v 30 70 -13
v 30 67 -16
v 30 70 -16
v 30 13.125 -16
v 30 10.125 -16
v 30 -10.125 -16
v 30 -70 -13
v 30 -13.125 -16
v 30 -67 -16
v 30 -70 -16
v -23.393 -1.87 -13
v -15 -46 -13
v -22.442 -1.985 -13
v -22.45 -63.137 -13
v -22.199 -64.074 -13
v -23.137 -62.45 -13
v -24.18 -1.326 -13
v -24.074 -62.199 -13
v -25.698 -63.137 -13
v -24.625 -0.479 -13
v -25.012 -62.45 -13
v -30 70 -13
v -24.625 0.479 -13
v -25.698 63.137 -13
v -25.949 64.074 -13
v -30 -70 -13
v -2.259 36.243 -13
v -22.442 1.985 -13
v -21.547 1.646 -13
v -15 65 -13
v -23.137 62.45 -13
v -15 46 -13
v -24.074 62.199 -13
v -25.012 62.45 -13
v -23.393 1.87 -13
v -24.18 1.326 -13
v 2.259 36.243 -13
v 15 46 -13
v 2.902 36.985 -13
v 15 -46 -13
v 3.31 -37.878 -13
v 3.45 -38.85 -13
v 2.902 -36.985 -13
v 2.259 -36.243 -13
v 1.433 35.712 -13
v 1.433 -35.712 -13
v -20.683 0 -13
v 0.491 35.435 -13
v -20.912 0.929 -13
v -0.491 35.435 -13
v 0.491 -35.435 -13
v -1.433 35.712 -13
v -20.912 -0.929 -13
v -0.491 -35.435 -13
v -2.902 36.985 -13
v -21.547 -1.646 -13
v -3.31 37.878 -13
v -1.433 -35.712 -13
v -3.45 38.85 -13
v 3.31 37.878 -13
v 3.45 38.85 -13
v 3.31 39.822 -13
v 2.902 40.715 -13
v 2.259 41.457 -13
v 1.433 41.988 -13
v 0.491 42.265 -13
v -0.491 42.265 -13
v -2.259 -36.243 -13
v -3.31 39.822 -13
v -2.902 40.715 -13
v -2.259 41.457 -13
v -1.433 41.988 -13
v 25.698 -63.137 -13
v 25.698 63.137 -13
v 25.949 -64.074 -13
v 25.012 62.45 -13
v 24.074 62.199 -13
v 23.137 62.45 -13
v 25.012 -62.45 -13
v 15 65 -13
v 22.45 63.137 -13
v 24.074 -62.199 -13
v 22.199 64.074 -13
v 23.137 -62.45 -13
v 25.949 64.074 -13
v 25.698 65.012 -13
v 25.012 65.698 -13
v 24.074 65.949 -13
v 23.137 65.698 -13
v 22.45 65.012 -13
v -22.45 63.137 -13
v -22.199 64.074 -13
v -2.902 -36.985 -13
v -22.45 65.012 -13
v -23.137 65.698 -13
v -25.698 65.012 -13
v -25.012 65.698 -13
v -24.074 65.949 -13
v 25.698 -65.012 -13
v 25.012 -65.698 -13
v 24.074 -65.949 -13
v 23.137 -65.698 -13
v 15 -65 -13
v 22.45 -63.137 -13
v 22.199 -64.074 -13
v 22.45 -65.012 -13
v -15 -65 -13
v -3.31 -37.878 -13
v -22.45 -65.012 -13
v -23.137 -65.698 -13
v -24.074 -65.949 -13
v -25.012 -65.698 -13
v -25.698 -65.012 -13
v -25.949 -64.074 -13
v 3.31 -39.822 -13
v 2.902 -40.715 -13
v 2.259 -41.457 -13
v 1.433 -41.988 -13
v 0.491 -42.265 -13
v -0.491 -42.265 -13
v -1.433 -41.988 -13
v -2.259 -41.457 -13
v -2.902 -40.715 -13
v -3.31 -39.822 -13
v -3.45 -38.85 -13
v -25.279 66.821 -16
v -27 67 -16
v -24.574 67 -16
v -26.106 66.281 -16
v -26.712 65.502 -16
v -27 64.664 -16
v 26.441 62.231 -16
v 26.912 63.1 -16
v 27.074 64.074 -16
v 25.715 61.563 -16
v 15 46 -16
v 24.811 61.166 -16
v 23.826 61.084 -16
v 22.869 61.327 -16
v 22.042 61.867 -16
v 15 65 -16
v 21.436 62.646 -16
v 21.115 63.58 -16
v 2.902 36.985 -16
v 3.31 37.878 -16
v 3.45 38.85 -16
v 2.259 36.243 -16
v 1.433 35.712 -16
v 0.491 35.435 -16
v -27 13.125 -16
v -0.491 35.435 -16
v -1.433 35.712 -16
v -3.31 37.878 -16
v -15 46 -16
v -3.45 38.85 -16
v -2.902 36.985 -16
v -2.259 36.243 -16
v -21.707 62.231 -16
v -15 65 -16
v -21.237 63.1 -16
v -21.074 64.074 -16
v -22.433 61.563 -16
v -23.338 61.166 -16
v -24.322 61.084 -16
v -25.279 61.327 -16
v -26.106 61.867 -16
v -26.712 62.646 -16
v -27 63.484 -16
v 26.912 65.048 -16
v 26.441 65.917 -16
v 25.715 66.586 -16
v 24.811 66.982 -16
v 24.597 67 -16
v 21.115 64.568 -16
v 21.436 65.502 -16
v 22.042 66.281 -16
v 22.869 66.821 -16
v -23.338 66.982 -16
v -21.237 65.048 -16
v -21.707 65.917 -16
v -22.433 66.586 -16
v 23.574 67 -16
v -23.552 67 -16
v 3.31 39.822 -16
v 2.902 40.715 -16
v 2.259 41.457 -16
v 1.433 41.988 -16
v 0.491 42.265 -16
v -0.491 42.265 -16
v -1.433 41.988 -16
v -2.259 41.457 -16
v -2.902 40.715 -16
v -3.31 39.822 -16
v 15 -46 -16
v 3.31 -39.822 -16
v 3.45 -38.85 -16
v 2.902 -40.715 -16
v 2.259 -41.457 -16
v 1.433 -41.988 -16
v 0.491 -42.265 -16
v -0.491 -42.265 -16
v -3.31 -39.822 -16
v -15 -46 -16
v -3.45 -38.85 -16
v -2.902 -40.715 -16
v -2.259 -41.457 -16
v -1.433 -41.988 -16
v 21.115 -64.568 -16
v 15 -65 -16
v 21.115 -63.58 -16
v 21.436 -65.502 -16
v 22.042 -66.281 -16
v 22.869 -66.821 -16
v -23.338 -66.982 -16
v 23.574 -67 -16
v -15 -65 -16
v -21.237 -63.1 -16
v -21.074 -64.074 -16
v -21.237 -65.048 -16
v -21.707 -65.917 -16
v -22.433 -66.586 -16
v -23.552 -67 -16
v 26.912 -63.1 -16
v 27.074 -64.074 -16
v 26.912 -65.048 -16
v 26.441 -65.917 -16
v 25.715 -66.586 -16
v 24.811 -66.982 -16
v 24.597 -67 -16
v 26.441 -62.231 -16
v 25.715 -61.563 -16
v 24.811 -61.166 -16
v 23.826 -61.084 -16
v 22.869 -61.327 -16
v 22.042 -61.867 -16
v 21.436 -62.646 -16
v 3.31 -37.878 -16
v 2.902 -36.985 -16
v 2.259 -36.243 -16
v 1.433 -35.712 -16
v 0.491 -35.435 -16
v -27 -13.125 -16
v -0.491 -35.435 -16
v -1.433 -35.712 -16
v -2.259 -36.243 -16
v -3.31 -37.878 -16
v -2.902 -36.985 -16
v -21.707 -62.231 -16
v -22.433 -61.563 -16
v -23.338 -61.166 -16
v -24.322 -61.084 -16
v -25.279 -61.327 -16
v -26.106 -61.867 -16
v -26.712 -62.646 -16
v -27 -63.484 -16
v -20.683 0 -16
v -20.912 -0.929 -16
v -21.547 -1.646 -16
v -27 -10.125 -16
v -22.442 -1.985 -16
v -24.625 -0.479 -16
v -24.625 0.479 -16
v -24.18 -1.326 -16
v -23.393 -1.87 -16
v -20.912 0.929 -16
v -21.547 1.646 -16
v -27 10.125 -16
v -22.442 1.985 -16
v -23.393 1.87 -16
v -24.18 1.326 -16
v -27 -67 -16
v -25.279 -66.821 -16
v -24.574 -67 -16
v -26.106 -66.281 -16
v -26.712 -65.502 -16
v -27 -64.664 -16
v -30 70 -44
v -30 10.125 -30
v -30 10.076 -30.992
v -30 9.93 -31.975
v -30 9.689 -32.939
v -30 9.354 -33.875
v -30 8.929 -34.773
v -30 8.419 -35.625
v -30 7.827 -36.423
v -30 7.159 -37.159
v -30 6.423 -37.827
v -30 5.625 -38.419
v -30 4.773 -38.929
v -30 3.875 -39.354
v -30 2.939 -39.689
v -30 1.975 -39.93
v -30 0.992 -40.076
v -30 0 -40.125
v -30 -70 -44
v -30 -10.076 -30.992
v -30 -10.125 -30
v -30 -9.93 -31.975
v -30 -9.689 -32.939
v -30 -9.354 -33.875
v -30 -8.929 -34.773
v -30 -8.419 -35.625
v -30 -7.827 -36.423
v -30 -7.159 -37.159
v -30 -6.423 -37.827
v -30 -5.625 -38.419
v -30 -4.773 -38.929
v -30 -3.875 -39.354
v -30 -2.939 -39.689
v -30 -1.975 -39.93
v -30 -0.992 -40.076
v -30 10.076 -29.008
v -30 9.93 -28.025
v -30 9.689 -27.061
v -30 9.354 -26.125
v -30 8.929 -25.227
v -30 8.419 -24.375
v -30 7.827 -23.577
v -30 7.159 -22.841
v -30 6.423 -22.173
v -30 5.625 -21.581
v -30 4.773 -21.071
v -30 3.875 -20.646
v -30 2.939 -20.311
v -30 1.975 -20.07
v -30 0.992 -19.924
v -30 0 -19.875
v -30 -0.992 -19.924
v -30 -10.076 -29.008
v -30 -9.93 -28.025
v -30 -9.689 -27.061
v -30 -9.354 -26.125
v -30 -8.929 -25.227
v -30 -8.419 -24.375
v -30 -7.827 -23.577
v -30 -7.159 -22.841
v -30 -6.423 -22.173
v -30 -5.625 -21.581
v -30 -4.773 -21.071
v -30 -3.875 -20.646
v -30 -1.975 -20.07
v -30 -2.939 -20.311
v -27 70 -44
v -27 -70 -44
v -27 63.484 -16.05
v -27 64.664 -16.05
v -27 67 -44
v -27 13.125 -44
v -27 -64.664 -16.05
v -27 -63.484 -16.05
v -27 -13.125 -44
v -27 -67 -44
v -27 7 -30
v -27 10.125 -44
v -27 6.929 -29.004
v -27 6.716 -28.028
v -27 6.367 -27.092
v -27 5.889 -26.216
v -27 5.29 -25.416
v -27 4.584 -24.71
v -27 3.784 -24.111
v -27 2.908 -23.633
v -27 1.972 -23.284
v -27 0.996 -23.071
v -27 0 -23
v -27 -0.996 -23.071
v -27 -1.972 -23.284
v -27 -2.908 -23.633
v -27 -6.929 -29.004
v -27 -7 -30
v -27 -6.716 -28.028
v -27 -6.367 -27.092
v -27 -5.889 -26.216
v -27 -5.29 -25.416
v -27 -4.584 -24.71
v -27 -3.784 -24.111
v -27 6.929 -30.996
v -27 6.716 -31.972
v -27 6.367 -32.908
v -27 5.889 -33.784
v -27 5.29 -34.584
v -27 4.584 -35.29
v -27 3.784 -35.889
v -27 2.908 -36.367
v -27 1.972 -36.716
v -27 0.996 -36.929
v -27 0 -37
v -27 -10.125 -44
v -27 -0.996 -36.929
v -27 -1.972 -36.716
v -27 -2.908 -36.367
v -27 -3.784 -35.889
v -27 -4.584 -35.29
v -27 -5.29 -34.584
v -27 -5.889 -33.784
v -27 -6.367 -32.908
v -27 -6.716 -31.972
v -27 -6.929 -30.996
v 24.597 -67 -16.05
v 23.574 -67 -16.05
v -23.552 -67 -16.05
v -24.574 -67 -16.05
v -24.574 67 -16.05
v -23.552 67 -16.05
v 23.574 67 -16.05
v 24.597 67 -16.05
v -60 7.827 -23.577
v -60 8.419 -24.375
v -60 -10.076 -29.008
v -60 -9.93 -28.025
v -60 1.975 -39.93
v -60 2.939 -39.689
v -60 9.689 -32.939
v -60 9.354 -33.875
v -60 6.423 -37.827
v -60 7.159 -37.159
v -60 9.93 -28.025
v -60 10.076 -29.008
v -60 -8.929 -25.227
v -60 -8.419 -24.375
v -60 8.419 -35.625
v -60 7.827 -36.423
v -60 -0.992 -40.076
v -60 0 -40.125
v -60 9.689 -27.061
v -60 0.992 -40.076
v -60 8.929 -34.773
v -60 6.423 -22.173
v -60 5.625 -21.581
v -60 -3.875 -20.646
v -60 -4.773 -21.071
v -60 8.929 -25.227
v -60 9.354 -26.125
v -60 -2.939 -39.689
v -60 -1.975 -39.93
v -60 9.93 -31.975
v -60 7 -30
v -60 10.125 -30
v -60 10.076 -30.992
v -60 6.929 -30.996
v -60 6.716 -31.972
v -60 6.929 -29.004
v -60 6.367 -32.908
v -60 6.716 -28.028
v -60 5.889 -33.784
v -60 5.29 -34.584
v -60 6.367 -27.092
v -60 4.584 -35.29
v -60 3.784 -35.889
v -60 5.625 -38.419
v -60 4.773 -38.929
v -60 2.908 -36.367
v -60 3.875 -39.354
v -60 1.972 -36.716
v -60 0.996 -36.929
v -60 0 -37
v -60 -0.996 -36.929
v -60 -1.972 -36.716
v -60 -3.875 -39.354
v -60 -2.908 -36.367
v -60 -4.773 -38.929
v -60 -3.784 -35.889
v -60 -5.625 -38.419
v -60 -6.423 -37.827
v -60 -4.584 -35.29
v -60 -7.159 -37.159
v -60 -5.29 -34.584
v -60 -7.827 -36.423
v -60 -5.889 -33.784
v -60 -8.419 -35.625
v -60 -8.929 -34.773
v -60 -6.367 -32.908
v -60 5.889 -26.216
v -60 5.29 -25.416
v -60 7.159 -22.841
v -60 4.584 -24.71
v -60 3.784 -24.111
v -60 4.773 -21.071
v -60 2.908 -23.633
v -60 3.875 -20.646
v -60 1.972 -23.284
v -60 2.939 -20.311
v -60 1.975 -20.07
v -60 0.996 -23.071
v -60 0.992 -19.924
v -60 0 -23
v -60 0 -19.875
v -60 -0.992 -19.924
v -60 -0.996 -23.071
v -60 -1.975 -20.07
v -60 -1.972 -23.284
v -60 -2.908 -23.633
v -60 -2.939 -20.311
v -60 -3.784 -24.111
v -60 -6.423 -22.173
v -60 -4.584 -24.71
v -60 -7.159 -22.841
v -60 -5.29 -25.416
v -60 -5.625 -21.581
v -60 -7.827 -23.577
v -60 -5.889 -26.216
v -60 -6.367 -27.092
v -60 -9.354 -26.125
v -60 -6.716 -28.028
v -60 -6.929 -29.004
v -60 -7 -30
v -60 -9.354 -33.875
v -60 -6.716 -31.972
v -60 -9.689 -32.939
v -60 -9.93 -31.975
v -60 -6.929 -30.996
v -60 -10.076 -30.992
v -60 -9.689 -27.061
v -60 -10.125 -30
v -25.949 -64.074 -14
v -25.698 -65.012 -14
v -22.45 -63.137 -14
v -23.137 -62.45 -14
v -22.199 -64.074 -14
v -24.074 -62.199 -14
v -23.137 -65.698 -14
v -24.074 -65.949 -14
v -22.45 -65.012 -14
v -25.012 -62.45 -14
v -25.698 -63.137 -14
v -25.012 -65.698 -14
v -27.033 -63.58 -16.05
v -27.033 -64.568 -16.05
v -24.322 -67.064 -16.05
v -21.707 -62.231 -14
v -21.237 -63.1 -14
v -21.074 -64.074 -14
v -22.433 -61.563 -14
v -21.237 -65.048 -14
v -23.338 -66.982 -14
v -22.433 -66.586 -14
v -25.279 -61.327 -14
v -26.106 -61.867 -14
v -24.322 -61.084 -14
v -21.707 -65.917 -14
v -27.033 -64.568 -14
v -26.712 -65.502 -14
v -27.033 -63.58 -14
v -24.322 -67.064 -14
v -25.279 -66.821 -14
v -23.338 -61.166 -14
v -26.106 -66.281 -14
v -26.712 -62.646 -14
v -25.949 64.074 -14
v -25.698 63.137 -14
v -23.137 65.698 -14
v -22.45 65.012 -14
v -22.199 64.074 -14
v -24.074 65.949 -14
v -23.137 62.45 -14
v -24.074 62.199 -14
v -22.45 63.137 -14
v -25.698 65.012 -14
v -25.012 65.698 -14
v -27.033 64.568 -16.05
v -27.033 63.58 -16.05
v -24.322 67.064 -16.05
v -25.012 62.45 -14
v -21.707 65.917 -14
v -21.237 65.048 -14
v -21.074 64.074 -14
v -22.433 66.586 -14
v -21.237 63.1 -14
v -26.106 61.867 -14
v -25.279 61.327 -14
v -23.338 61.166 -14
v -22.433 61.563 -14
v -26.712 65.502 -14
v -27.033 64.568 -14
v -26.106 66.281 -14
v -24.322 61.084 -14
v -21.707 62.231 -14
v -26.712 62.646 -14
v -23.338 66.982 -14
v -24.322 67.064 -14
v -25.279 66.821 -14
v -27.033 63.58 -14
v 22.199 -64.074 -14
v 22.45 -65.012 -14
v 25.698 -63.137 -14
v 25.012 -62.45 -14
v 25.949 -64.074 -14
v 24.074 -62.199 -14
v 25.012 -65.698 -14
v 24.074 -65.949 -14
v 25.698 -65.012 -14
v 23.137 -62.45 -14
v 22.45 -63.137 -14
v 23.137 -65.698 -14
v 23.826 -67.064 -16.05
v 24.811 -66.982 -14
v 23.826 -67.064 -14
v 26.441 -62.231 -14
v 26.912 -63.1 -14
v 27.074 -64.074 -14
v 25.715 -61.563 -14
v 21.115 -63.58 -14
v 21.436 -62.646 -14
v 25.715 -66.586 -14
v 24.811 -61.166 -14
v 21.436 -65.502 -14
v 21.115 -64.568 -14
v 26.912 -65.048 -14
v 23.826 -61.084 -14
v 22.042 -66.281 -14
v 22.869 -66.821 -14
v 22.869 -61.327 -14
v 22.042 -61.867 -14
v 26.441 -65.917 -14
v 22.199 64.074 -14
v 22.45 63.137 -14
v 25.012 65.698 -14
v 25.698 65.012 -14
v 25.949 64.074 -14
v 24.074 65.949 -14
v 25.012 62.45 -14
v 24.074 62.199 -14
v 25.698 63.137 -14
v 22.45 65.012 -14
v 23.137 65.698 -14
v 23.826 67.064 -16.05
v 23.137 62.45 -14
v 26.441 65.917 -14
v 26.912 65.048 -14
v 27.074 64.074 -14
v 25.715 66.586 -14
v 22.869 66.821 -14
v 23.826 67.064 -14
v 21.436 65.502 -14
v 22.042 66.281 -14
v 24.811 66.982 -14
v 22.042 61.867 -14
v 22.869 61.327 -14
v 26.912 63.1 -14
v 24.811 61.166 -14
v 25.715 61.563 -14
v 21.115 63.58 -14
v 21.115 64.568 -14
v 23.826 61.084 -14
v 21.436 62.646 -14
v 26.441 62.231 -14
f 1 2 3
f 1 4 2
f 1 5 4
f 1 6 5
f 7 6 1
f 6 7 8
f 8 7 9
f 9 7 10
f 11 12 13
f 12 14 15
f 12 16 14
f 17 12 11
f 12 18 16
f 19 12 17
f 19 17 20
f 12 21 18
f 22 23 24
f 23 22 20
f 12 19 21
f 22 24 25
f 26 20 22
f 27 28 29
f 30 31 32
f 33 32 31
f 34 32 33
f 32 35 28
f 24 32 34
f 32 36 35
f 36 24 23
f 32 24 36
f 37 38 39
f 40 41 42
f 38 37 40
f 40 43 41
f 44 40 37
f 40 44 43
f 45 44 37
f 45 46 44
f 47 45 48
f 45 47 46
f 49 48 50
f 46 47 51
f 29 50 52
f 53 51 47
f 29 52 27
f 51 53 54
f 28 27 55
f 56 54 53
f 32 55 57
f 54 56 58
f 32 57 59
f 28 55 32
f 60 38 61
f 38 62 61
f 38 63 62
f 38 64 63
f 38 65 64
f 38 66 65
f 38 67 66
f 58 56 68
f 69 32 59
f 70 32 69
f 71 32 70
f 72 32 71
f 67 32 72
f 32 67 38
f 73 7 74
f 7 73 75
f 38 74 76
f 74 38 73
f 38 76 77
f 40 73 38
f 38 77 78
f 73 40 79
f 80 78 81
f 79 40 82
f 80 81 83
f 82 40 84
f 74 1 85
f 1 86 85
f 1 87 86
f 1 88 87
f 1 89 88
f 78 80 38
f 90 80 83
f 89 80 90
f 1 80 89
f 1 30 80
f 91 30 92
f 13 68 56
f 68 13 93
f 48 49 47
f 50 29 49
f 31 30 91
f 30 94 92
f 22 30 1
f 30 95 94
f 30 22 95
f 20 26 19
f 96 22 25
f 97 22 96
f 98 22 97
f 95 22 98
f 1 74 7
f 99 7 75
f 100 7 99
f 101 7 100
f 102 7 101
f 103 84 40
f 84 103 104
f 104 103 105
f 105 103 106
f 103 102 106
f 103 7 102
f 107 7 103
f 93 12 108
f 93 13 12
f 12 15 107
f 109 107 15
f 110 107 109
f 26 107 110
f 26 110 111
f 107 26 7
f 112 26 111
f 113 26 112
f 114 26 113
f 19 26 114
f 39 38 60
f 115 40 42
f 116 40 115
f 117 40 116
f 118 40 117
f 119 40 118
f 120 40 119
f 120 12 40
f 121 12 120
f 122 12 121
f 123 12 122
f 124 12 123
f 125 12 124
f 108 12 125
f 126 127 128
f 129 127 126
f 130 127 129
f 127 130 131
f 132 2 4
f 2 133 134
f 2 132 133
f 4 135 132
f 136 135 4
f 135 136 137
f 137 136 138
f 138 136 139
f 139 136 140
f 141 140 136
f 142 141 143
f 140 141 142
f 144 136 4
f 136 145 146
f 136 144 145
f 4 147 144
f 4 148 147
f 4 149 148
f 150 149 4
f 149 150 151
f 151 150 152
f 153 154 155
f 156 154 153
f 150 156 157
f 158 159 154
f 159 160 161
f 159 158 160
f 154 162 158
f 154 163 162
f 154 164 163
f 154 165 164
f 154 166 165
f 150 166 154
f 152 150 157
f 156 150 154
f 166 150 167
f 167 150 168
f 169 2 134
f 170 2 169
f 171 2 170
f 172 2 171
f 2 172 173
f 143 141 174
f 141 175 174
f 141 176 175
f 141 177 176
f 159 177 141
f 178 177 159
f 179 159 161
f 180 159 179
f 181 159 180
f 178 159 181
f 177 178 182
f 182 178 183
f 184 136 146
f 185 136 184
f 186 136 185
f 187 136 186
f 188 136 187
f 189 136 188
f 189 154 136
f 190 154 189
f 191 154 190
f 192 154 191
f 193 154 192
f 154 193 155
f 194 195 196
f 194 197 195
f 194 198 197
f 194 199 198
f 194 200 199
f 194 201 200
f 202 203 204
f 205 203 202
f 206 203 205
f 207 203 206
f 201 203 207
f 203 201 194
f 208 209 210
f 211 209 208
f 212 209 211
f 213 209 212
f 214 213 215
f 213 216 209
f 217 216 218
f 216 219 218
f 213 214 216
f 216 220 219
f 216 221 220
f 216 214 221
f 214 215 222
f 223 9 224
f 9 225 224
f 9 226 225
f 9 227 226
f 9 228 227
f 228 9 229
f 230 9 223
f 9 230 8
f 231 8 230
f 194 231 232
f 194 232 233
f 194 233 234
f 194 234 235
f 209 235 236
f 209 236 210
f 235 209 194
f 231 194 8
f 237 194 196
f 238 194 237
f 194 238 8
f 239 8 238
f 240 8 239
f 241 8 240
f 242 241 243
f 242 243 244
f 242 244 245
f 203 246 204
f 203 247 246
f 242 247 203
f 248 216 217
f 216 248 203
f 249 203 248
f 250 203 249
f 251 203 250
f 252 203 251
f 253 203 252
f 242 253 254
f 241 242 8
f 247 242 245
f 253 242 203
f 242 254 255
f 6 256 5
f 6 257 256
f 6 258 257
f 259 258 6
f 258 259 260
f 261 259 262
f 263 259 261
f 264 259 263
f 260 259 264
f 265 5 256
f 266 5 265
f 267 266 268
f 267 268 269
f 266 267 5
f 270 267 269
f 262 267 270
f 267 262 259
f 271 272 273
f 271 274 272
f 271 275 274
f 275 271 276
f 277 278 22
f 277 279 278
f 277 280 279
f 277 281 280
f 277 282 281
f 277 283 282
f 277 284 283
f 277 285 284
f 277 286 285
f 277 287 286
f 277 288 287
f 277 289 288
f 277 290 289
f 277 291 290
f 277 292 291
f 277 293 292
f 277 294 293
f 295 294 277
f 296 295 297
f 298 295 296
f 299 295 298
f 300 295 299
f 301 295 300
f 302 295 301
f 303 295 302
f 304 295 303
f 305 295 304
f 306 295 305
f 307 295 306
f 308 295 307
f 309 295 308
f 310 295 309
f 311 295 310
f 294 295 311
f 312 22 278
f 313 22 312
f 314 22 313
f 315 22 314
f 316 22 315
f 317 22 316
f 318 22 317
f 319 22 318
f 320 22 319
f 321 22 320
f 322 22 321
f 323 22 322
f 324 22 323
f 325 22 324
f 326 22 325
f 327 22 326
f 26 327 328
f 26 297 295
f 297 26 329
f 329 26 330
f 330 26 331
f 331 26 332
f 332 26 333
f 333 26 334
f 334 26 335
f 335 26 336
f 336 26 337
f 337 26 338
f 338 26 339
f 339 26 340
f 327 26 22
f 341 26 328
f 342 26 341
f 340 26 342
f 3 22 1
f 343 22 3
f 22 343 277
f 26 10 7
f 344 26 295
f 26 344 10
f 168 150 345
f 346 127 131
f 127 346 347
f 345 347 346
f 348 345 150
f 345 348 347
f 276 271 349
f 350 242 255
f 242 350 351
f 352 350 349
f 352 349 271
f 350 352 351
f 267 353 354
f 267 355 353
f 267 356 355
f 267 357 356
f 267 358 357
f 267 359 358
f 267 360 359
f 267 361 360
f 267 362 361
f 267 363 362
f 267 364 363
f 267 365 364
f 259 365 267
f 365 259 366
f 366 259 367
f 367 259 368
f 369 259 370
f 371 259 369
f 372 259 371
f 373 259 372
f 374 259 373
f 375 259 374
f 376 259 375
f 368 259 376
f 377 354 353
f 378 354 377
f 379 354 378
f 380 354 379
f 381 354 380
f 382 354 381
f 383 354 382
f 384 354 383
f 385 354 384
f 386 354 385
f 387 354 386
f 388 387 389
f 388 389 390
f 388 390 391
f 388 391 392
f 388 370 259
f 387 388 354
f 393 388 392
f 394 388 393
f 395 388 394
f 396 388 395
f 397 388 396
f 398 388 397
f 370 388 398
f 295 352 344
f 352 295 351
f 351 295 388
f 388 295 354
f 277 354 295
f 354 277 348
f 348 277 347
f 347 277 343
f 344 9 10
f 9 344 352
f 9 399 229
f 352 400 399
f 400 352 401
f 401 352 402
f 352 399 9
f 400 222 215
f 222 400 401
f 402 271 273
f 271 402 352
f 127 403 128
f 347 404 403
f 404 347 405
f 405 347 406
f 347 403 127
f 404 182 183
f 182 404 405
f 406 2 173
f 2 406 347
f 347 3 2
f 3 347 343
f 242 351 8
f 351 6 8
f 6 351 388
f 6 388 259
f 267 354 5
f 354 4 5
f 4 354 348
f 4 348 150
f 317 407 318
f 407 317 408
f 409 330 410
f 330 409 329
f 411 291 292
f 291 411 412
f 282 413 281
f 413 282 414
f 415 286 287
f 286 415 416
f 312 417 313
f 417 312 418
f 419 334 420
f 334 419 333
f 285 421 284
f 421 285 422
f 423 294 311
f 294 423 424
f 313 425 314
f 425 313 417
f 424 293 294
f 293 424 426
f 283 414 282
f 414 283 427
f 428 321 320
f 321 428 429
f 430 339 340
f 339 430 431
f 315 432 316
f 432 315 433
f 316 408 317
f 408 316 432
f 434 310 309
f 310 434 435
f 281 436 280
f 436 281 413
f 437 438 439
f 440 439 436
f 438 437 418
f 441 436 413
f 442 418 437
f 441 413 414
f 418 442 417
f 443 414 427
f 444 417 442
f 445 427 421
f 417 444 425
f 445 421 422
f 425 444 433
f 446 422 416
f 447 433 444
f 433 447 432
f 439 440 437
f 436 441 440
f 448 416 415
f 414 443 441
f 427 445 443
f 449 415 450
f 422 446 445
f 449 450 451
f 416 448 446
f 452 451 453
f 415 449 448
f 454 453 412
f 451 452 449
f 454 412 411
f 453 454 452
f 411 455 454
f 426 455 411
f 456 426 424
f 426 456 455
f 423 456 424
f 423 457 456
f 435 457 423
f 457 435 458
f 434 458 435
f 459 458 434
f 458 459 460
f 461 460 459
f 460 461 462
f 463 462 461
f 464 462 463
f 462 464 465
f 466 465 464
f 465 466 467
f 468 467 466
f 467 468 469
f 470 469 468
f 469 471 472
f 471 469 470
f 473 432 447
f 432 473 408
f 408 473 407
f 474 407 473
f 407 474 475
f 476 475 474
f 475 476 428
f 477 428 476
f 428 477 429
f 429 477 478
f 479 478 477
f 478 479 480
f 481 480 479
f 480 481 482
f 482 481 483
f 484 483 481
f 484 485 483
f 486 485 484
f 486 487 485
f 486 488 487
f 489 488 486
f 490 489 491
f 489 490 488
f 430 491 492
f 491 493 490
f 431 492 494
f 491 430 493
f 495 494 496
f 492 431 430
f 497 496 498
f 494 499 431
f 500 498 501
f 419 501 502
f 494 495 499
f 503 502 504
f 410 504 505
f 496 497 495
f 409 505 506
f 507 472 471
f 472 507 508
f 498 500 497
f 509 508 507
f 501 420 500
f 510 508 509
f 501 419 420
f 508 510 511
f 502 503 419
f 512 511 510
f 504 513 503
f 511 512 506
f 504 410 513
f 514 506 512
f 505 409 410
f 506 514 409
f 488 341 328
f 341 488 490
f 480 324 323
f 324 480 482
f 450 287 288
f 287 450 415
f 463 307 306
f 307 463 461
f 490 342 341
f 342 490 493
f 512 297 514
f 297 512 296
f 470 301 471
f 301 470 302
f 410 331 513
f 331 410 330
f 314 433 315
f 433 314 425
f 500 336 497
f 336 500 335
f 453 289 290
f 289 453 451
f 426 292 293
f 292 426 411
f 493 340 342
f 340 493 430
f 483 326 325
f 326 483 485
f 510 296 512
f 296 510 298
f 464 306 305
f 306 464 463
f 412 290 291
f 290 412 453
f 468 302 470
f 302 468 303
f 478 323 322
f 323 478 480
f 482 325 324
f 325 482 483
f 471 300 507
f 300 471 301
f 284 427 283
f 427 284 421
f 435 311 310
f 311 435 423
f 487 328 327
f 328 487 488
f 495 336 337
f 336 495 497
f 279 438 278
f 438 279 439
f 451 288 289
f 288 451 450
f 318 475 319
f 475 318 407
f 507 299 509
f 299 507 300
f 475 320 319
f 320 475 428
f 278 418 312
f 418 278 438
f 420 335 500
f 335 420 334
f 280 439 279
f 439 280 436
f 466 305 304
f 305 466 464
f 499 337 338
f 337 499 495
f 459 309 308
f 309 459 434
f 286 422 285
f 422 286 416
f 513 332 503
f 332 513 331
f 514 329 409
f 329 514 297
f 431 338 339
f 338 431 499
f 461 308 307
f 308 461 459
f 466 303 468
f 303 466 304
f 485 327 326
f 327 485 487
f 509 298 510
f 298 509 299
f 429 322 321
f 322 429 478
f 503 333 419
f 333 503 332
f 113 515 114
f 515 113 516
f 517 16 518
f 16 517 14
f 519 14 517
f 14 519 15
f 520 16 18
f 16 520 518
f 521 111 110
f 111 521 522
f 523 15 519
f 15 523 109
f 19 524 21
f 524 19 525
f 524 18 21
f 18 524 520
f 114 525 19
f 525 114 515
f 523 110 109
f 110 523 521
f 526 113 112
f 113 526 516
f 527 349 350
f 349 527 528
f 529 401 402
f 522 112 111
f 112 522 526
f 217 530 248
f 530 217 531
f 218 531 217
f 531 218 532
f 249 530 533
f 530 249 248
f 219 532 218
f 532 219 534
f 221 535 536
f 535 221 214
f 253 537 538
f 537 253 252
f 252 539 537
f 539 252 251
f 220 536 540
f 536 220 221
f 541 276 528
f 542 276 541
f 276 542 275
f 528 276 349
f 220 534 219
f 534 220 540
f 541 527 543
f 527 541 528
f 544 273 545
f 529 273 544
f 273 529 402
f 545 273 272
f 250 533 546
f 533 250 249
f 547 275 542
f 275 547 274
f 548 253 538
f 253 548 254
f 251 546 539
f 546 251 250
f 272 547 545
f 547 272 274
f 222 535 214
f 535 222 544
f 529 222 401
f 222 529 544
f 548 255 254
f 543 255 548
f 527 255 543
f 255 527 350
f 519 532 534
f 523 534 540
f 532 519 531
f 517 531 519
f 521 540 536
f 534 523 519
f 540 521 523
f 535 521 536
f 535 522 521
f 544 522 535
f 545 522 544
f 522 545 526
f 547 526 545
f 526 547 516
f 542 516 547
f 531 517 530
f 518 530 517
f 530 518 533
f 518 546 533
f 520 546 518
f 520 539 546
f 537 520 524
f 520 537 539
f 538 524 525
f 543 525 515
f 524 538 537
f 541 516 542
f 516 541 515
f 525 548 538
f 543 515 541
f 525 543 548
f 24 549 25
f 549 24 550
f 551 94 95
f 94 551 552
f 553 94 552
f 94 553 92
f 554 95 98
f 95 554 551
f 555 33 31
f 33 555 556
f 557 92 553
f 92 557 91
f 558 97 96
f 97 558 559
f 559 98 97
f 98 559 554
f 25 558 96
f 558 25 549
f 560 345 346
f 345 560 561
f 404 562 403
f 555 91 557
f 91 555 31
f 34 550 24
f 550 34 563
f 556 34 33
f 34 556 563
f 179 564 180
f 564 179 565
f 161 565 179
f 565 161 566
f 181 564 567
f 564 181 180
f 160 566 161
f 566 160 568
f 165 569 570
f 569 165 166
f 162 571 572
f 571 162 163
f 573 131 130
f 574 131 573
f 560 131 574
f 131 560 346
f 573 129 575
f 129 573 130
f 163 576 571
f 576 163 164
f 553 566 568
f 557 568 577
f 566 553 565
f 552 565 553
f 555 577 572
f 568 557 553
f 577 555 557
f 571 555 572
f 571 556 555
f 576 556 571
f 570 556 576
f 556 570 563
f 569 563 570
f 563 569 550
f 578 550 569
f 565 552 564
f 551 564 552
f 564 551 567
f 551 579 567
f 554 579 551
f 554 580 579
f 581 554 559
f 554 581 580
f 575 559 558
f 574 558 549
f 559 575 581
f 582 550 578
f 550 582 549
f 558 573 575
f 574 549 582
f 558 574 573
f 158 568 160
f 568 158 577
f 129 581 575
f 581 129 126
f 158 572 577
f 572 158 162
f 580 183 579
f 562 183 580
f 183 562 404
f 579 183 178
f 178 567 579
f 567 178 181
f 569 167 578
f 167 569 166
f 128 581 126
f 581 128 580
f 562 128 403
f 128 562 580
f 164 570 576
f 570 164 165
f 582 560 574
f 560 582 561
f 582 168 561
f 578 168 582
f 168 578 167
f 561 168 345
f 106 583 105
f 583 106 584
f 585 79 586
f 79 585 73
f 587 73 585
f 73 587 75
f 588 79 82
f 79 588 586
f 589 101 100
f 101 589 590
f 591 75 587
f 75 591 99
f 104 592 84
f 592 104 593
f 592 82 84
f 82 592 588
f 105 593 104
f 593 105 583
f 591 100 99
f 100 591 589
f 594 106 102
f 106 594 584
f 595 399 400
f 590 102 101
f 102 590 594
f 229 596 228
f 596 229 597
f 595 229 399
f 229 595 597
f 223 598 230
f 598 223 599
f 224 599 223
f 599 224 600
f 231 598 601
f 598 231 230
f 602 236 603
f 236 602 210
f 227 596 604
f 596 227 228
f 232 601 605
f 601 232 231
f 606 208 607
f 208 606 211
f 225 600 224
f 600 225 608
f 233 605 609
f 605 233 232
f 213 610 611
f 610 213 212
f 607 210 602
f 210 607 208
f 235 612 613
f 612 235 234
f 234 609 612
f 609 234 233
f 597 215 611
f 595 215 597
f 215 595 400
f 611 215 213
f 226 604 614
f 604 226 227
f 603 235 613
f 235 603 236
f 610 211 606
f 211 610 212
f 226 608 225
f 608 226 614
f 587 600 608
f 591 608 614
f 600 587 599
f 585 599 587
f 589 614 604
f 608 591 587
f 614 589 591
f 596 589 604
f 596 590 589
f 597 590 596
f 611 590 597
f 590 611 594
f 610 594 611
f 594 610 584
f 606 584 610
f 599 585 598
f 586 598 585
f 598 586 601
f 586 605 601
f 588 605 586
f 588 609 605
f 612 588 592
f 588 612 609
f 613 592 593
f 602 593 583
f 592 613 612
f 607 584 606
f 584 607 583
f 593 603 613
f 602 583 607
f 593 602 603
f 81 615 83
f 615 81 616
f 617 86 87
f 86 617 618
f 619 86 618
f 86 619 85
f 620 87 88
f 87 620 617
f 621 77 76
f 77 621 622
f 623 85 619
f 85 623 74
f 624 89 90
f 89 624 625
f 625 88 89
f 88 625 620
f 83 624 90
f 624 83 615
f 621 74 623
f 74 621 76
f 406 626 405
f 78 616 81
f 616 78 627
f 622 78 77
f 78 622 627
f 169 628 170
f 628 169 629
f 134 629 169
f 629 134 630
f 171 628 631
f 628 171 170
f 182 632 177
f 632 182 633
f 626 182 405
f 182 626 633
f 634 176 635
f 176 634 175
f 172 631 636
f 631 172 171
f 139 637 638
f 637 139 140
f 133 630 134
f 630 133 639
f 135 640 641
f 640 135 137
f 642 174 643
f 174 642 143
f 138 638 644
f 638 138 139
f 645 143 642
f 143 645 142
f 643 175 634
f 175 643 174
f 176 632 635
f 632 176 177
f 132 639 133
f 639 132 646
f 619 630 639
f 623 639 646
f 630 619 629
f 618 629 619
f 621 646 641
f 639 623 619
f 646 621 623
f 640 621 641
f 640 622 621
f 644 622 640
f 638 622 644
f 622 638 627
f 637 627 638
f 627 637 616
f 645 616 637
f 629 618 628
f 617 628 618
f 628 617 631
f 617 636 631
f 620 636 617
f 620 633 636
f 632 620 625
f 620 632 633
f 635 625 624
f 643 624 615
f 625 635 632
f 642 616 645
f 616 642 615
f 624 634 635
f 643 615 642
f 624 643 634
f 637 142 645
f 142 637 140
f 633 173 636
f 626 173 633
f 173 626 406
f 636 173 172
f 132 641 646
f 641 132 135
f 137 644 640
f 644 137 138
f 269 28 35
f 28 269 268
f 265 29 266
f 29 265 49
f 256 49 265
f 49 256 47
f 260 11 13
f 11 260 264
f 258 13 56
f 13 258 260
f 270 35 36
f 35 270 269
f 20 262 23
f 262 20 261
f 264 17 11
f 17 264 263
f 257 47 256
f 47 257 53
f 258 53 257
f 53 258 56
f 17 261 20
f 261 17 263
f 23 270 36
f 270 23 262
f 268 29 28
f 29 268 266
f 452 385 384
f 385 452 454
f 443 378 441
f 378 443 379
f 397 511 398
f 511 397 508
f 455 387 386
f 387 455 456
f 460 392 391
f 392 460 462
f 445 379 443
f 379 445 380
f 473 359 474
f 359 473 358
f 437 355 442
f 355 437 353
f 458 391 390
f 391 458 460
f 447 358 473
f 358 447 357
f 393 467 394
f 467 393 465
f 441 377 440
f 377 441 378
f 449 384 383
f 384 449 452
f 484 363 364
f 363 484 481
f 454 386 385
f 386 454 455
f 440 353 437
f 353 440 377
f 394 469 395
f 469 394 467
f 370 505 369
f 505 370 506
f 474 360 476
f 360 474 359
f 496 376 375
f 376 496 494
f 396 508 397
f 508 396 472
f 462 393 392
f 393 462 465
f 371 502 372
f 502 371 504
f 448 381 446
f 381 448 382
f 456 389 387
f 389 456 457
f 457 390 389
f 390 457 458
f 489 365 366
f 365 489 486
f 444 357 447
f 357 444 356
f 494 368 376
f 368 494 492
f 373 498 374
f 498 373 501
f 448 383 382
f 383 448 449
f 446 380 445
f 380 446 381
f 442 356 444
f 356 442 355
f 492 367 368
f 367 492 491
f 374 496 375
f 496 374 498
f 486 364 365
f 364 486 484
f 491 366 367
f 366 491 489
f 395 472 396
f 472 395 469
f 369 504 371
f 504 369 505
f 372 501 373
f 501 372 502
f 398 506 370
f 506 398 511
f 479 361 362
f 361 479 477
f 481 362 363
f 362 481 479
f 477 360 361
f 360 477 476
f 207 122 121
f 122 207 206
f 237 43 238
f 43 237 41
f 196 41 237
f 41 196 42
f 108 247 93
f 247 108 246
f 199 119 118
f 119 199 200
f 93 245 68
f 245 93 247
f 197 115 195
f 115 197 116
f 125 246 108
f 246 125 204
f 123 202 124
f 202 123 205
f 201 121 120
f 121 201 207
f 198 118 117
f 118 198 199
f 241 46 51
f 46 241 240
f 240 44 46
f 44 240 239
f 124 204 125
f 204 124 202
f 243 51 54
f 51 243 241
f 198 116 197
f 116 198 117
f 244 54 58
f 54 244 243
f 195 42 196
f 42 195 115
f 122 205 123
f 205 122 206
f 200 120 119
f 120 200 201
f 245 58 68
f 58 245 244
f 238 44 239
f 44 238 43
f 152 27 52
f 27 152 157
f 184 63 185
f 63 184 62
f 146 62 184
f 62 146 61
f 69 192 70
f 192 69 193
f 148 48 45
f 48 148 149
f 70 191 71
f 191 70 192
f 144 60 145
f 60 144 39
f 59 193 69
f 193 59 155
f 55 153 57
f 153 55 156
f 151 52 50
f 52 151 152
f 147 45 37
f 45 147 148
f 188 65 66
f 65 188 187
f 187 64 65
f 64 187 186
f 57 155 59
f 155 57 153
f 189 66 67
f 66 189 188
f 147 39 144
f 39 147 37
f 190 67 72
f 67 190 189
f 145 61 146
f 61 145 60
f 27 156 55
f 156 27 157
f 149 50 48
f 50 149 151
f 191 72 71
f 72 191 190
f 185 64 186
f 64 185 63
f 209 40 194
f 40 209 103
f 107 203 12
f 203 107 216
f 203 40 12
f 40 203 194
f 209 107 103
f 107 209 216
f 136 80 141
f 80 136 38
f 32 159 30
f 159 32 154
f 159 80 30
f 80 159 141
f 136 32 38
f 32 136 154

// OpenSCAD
///////////////////////////////////////////////////////////////////////////////////
// 
// Tipping bucket rain gauge
//
// Designed by: Dan Bemowski
// Website    : http://dan.bemowski.info
// 
// This is for building a weather station rain gauge to connect to an arduino 
// microcontroller to measure rainfall amounts. The US standard diameter for a rain
// gauge is 8 in or 20.32 cm.  This was the measurement used to make the funnel.  I 
// use a height of 5 cm for the side wall as a splash guard and larger catchment 
// volume for heavier rainfalls.
//
// This project uses the standard tipping bucket method for measuring the rainfall.
// The tipping bucket is designed to hold a 4.25 mm neodymium disc magnet that will
// pass by a magnetic reed switch that will be attached to the arduino to measure
// the tipping bucket pulses.
//
// For calibrating the gauge, I am using the information from an instructables page
// that deals with connecting a small commercial tipping bucket rain sensor unit to
// an arduino.  The same information applies to this gauge which I am hoping will 
// be slightly more accurate than the small commercial versions.
// http://www.instructables.com/id/Arduino-Rain-Gauge-Calibration/
//
///////////////////////////////////////////////////////////////////////////////////

$fa=1;
$fs=1;

//I always use a fudge factor to fix an issue that happens in preview mode when
//difference is used. The issue is that hashed lines are shown at edges when
//hollowing out an area. Adding a small distance to the area being removed will
//prevent that hashing from showing.
fudge = 0.1;

//Here we define what we want to view
// available options are: base, funnel, tipping_bucket, base_bucket, base_support, all
view = "base_support";

//---------------------------------------------------------------------------------
//**** Funnel dimensions ****
//---------------------------------------------------------------------------------
bowl_h=40; //Funnel bowl height
bowl_r=101.6; //Funnel bowl radius
stem_h=10; //funnel stem height
stem_d=6; //Funnel stem diameter
funnel_wall_t=3; //Funnel wall thickness
splash_guard_d = 209.3; //Raised splash guard diameter
splash_guard_h = 50; //Raised splash guard height
funnel_offset_h = 30; //Funnel offset height

//---------------------------------------------------------------------------------
//**** Funnel cover case dimensions for the tipping bucket assembly ****
//---------------------------------------------------------------------------------
case_w = 60; //Case width
case_l = 140; //Case depth
case_h = 80; //Case height

case_t = 3; //Case wall thickness

//These values are to shave off the top part of the case that sticks into the funnel
//after it is drawn. The values are derived from the defined funnel dimensions. When 
//the funnel is drawn, the inside will then be smooth.
funnel_clearance_h = bowl_h; 
funnel_clearance_bottom_r = stem_d-funnel_wall_t;
funnel_clearance_top_r = bowl_r;

mount_hole_d = 8; //Mounting screw post diameter
screw_hole_d = 3; //Screw

//---------------------------------------------------------------------------------
//**** Tipping bucket ****
//---------------------------------------------------------------------------------
platform_w = 30; //Platform width
platform_l = 106.4; //Platform length 96.4
platform_z_offset = 0; //The offset distance of the platform in the Z direction
bucket_wall_t = 3;  //Thickness of the bucket walls

bucket_divider_h = 17; //Bucket divider height
bucket_divider_v_distance = 32; //Bucket divider height

pivot_arm_support_w = 7; //Pivot arm support_block width
pivot_arm_support_l = 8; //Pivot arm support_block length
pivot_arm_support_h = 5; //Pivot arm support_block height
pivot_peg_d = 3.8; //Pivot peg diameter
pivot_peg_l = 3; //Pivot peg length

magnet_holder_h = 2;
magnet_holder_outer_d = 6.2;
magnet_holder_inner_d = 4.4;

adjustment_standoff_h = 3.5;
adjustment_standoff_d = 10;
adjustment_standoff_spacing = 80;

//---------------------------------------------------------------------------------
//**** Base to hold the tipping bucket assembly ****
//---------------------------------------------------------------------------------
bucket_standoff_w = 4;
bucket_standoff_l = 12;
bucket_standoff_h = 18;

standoff_spacing = platform_w+0.7;

angled_support_w = 5;
angled_support_h = bucket_standoff_h/2;

reed_switch_board_w = 6.5;
reed_switch_board_h = 31;
reed_switch_board_d = 3;
reed_switch_board_offset_x = -4.2;
reed_switch_board_screw_hole_h = 8;

reed_switch_board_holder_offset_z = pivot_arm_support_h+1;
reed_switch_board_holder_h = 30;

reed_switch_board_top_slot_h = 7;
reed_switch_board_top_slot_d = reed_switch_board_d+1;

tipping_bucket_peg_hole_d = 4.5;
tipping_bucket_peg_hole_slot_h = 6;
tipping_bucket_peg_hole_slot_slide_h = 8;

main_base_w = 60;
main_base_l = 140;
main_base_t = 3;

platform_lip_w = 52;
platform_lip_l = 132;
platform_lip_t = 1;

main_base_offset_h = -16;

base_adjustment_standoff_h = 1.32;
base_adjustment_standoff_spacing = 77.7;
base_adjustment_screw_hole_d = 2.9;

side_wall_h = 28;

mounting_pipe_l = 30;
//A standard 3/4" PVC pipe inside diameter is 0.824 in or 20.93 mm, so I made this 
//slightly smaller so it would fit inside the 3/4" pipe
mounting_pipe_od = 20.25; 
//This will give us a 6.25 mm or ~1/4 in wall thickness for the attachment nipple
//which will give it good strength.
mounting_pipe_id = 14;

mounting_screw_head_t = 2;
mounting_screw_head_d = 6;

bucket_drain_w = 30;
bucket_drain_l = 19;
bucket_drain_recess = 2;
bucket_drain_edge_offset = 1;
bucket_drain_hole_w = 4.3;
bucket_drain_hole_l = 6;
//---------------------------------------------------------------------------------

/**
 * funnel_cover - This is the rain catchment funnel with the attached cover for the
 *                tipping bucket assembly.  
 */
module funnel_cover() {
    difference() {
        //Create the funnel cover case
        case();
        //Shave the top for smoothing the inside of the funnel
        translate([0, 0, funnel_clearance_h-1]) cylindrical_coupling(h=funnel_clearance_h,r1=funnel_clearance_bottom_r,r2=funnel_clearance_top_r);
    }
    //Create the top splash guard
    translate([0, 0, funnel_offset_h+splash_guard_h]) pipe(od=splash_guard_d, id=splash_guard_d-(funnel_wall_t*2), height=splash_guard_h);
    //Add the main funnel
    translate([0, 0, funnel_offset_h]) funnel();
}

/**
 * funnel - Used to create a funnel
 */
module funnel() {
    translate([0, 0, stem_h]) {
        difference() {
            cylindrical_coupling(h=bowl_h,r1=(stem_d/2)+funnel_wall_t,r2=bowl_r+funnel_wall_t);
            cylindrical_coupling(h=bowl_h+1,r1=(stem_d/2),r2=bowl_r);
        }
    }
    pipe(od=stem_d+(funnel_wall_t*2), id=stem_d, height=stem_h);
}

/**
 * pipe - Used to create a pipe with a defined outside and inside diameter and 
 *        height/length
 */
module pipe(od=10, id=7, height=10) {
    difference() {
        cylinder(d=od, h=height);
        translate([0,0,-1]) cylinder(d=id, h=height+2);
    }
}

/**
 * case - Used to create the box shroud for the tipping bucket assembly with 
 *        mounting screw standoffs
 */
module case() {
    difference() {
        translate([-(case_w/2), -(case_l/2), -16]) cube([case_w, case_l, case_h]);
        translate([-(case_w/2)+case_t, -(case_l/2)+case_t, -17]) cube([case_w-(case_t*2), case_l-(case_t*2), 82]);
    }
    for(x=[-1, 1], y=[-1, 1]) {
        difference() {
            translate([x*((case_w/2)-(mount_hole_d/1.35)), y*((case_l/2)-(mount_hole_d/1.35)), -14.75]) cylinder(case_h, d=mount_hole_d);
            translate([x*((case_w/2)-(mount_hole_d/1.35)), y*((case_l/2)-(mount_hole_d/1.35)), -14.75]) cylinder(case_h, d=screw_hole_d);
        }
    }
}

/**
 * bucket - Used to create the tipping bucket
 */
module bucket() {
    translate([0, 0, pivot_arm_support_h]) {
        difference() {
            union() {
                //main bucket platform
                translate([-(platform_w/2), -(platform_l/2), platform_z_offset]) cube([platform_w, platform_l, bucket_wall_t]);

                //pivot 1
                translate([(platform_w/2)-pivot_arm_support_w, -4, platform_z_offset-pivot_arm_support_h]) cube([pivot_arm_support_w, pivot_arm_support_l, pivot_arm_support_h]);
                translate([(platform_w/2)-pivot_arm_support_w, 0, platform_z_offset-pivot_arm_support_h]) rotate([90, 0, 90]) cylinder(d=pivot_arm_support_l, h=pivot_arm_support_w);
                translate([(platform_w/2), 0, platform_z_offset-pivot_arm_support_h]) rotate([90, 0, 90]) cylinder(d=pivot_peg_d, h=pivot_peg_l);

                //pivot 2
                translate([-(platform_w/2), -4, platform_z_offset-pivot_arm_support_h]) cube([pivot_arm_support_w, pivot_arm_support_l, pivot_arm_support_h]);
                translate([-(platform_w/2), 0, platform_z_offset-pivot_arm_support_h]) rotate([90, 0, 90]) cylinder(d=pivot_arm_support_l, h=pivot_arm_support_w);
                translate([-(platform_w/2)-pivot_peg_l, 0, platform_z_offset-pivot_arm_support_h]) rotate([90, 0, 90])  cylinder(d=pivot_peg_d, h=pivot_peg_l);

                //bucket divider
                translate([(platform_w/2), 0, platform_z_offset+bucket_wall_t]) rotate([0, 270, 0]) Triangle(a=(bucket_divider_v_distance/2), b=bucket_divider_h, angle=90, height=platform_w);
                translate([-(platform_w/2), 0, platform_z_offset+bucket_wall_t]) rotate([180, 270, 0]) Triangle(a=(bucket_divider_v_distance/2), b=bucket_divider_h, angle=90, height=platform_w);

                //bucket sides
                translate([(platform_w/2), 0, platform_z_offset+bucket_wall_t]) rotate([0, 270, 0]) Triangle(a=platform_l/2, b=bucket_divider_h, angle=90, height=3);
                translate([-(platform_w/2)+bucket_wall_t, 0, platform_z_offset+bucket_wall_t]) rotate([0, 270, 0]) Triangle(a=platform_l/2, b=bucket_divider_h, angle=90, height=3);
                translate([(platform_w/2)-bucket_wall_t, 0, platform_z_offset+bucket_wall_t]) rotate([180, 270, 0]) Triangle(a=platform_l/2, b=bucket_divider_h, angle=90, height=3);
                translate([-(platform_w/2), 0, platform_z_offset+bucket_wall_t]) rotate([180, 270, 0]) Triangle(a=platform_l/2, b=bucket_divider_h, angle=90, height=3);

                //round magnet holder for
                difference() {
                    translate([-(platform_w/2)-magnet_holder_h, 0, platform_z_offset+16.5]) rotate([90, 0, 90]) cylinder(d=magnet_holder_outer_d, h=magnet_holder_h);
                    translate([-(platform_w/2)-magnet_holder_h-(fudge/2), 0, platform_z_offset+16.5]) rotate([90, 0, 90]) cylinder(d=magnet_holder_inner_d, h=magnet_holder_h);
                }
                //offset weight to balance the other side
                translate([(platform_w/2), 0, platform_z_offset+16.5]) rotate([90, 0, 90]) cylinder(d=magnet_holder_outer_d, h=magnet_holder_h);
                //adjustment standoffs
                difference() {
                    translate([0, adjustment_standoff_spacing/2, platform_z_offset-(adjustment_standoff_h/2)]) rotate([20, 0, 0]) cylinder(d=adjustment_standoff_d, h=adjustment_standoff_h);
                    translate([-4, adjustment_standoff_spacing/2, platform_z_offset+3]) cube([8, 8, 1]);
                }
                difference() {
                    translate([0, -(adjustment_standoff_spacing/2), platform_z_offset-(adjustment_standoff_h/2)]) rotate([-20, 0, 0]) cylinder(d=adjustment_standoff_d, h=adjustment_standoff_h);
                    translate([-4, -48, platform_z_offset+bucket_wall_t]) cube([8, 8, 1]);
                }
            }
            //hollow out the bucket divider
            translate([(platform_w-(pivot_arm_support_w*2))/2, -(fudge/2), platform_z_offset-(fudge/2)]) rotate([0, 270, 0]) Triangle(a=(bucket_divider_v_distance/2), b=bucket_divider_h, angle=90, height=platform_w-(pivot_arm_support_w*2));
            translate([-(platform_w-(pivot_arm_support_w*2))/2, (fudge/2), platform_z_offset-(fudge/2)]) rotate([180, 270, 0]) Triangle(a=(bucket_divider_v_distance/2), b=bucket_divider_h, angle=90, height=platform_w-(pivot_arm_support_w*2));
            
            //shave off the corners to the same angle as the standoffs
            translate([0, adjustment_standoff_spacing/2-(fudge/2), platform_z_offset-adjustment_standoff_h-(fudge*1.31)]) rotate([20, 0, 0]) cube([platform_w+fudge, adjustment_standoff_d*4, adjustment_standoff_h], center=true);
            translate([0, -(adjustment_standoff_spacing/2)-(fudge/2), platform_z_offset-adjustment_standoff_h-(fudge*1.31)]) rotate([-20, 0, 0]) cube([platform_w+fudge, adjustment_standoff_d*4, adjustment_standoff_h], center=true);
        }
    }
}

/**
 * base - Used to create the base mounting platform that holds the tipping bucket
 *        and the magnetic reed switch.  It also has a side mounting nipple to 
 *        attach to a standard PVC pipe.
 */
module base() {
    // uprights for holding tipping bucket
    difference() {
        union() {
            translate([standoff_spacing/2, -(bucket_standoff_l/2), main_base_offset_h+main_base_t+platform_lip_t]) cube([bucket_standoff_w, bucket_standoff_l, bucket_standoff_h]);
            translate([-(standoff_spacing/2)-bucket_standoff_w, -(bucket_standoff_l/2), main_base_offset_h+main_base_t+platform_lip_t]) cube([bucket_standoff_w, bucket_standoff_l, bucket_standoff_h]);
            translate([-(standoff_spacing/2)-bucket_standoff_w, -(bucket_standoff_l/2), angled_support_w]) rotate([0, 90, 90]) Triangle(a=angled_support_w, b=angled_support_h, angle=90, height=bucket_standoff_l);
            translate([-(standoff_spacing/2)-bucket_standoff_w-angled_support_w, -(bucket_standoff_l/2), angled_support_w]) cube([angled_support_w, bucket_standoff_l, reed_switch_board_holder_h]);
            translate([-(standoff_spacing/2)-bucket_standoff_w-angled_support_w, 0, reed_switch_board_holder_h+angled_support_w]) rotate([0, 90, 0]) cylinder(d=bucket_standoff_l, h=angled_support_w);
        }
        // slot for magnetic reed switch
        translate([-((standoff_spacing/2)+bucket_standoff_w+reed_switch_board_d)-(fudge/2), reed_switch_board_offset_x, reed_switch_board_holder_offset_z]) cube([reed_switch_board_d+fudge, reed_switch_board_w, reed_switch_board_h]);
        //slightly deeper slot space at top for wire connection on reed switch board
        translate([-((standoff_spacing/2)+bucket_standoff_w+reed_switch_board_d+1), reed_switch_board_offset_x, reed_switch_board_h]) cube([reed_switch_board_top_slot_d, reed_switch_board_w, reed_switch_board_top_slot_h]);
        // screw mounting hole for reed switch
        translate([-(standoff_spacing/2)-bucket_standoff_w-angled_support_w-(fudge/2), (reed_switch_board_w/2)+reed_switch_board_offset_x, reed_switch_board_screw_hole_h]) rotate([0, 90, 0]) cylinder(d=1.25, h=8+fudge);
        // hole for wire
        translate([-(standoff_spacing/2)-bucket_standoff_w-angled_support_w-(fudge/2), (reed_switch_board_w/2)+reed_switch_board_offset_x, 36.5]) rotate([0, 90, 0]) cylinder(d=3.25, h=3+fudge);
        //slots for the tipping bucket pegs to rest in
        translate([-((standoff_spacing/2)+(bucket_standoff_w/3)), -(tipping_bucket_peg_hole_d/2), 0]) cube([standoff_spacing+((bucket_standoff_w/3)*2), tipping_bucket_peg_hole_d, tipping_bucket_peg_hole_slot_h]);
        translate([-((standoff_spacing/2)+((bucket_standoff_w/3)*2)), 0, 0]) rotate([0, 90, 0]) cylinder(d=tipping_bucket_peg_hole_d, h=(standoff_spacing+((bucket_standoff_w/3)*2)*2));
        translate([-((standoff_spacing/2)+0.25), -(tipping_bucket_peg_hole_d/2), tipping_bucket_peg_hole_slot_slide_h+fudge]) rotate([0, 90, 90]) Triangle(a=bucket_standoff_w+(fudge/2), b=tipping_bucket_peg_hole_slot_slide_h, angle=90, height=tipping_bucket_peg_hole_d);
        translate([((standoff_spacing/2)+0.25), (tipping_bucket_peg_hole_d/2), tipping_bucket_peg_hole_slot_slide_h+fudge]) rotate([0, 90, 270]) Triangle(a=bucket_standoff_w+(fudge/2), b=tipping_bucket_peg_hole_slot_slide_h, angle=90, height=tipping_bucket_peg_hole_d);
    }

    // main base
    difference() {
        union() {
            // base platform
            translate([-(main_base_w/2), -(main_base_l/2), main_base_offset_h]) cube([main_base_w, main_base_l, main_base_t]);
            // platform lip
            translate([-(platform_lip_w/2), -(platform_lip_l/2), main_base_offset_h+main_base_t]) cube([platform_lip_w, platform_lip_l, platform_lip_t]);
            // bucket tipping adjustment stands
            translate([0, -(base_adjustment_standoff_spacing/2), main_base_offset_h+main_base_t+platform_lip_t]) cylinder(d=adjustment_standoff_d, h=base_adjustment_standoff_h);
            translate([0, (base_adjustment_standoff_spacing/2), main_base_offset_h+main_base_t+platform_lip_t]) cylinder(d=adjustment_standoff_d, h=base_adjustment_standoff_h);
        }
        //hole for wire to drop through to mounting pipe
        translate([-(standoff_spacing/2)-bucket_standoff_w-((angled_support_w*2)/3), 0, main_base_offset_h-(fudge/2)]) cylinder(d=4, h=main_base_t+platform_lip_t+fudge);
        
        //screw holes to attach to the funnel
        for(x=[-1, 1], y=[-1, 1]) {
            translate([x*((case_w/2)-(mount_hole_d/1.35)), y*((case_l/2)-(mount_hole_d/1.35)), main_base_offset_h-(fudge/2)]) cylinder(d=screw_hole_d+0.75, h=base_adjustment_standoff_h+platform_lip_t+main_base_t+fudge);
            //translate([x*((case_w/2)-(mount_hole_d/1.35)), y*((case_l/2)-(mount_hole_d/1.35)), main_base_offset_h-(fudge/2)]) cylinder(d=mounting_screw_head_d, h=mounting_screw_head_t+(fudge/2));
        }
        // bucket adjustment screw holes
        translate([0, -(base_adjustment_standoff_spacing/2), main_base_offset_h-(fudge/2)]) cylinder(d=base_adjustment_screw_hole_d, h=base_adjustment_standoff_h+platform_lip_t+main_base_t+fudge);
        translate([0, (base_adjustment_standoff_spacing/2), main_base_offset_h-(fudge/2)]) cylinder(d=base_adjustment_screw_hole_d, h=base_adjustment_standoff_h+platform_lip_t+main_base_t+fudge);
        
        // left bucket drain
        translate([-(bucket_drain_w/2), -(platform_lip_l/2)+bucket_drain_edge_offset, main_base_offset_h+main_base_t+platform_lip_t-bucket_drain_recess]) cube([bucket_drain_w, bucket_drain_l, bucket_drain_recess+(fudge/2)]);
        
        for(x=[-15, -9.9, -4.7, 0.60, 5.7, 10.7]) {
            for(y=[-65, -58.5, -52]) {
                translate([x, y, main_base_offset_h-(fudge/2)]) cube([bucket_drain_hole_w, bucket_drain_hole_l, main_base_t+platform_lip_t+fudge]);
            }
        }
        
        // right bucket drain
        translate([-(bucket_drain_w/2), (platform_lip_l/2)-bucket_drain_edge_offset-bucket_drain_l, main_base_offset_h+main_base_t+platform_lip_t-bucket_drain_recess]) cube([bucket_drain_w, bucket_drain_l, bucket_drain_recess+(fudge/2)]);
        
        for(x=[-15, -9.9, -4.7, 0.60, 5.7, 10.7]) {
            for(y=[59, 52.5, 46]) {
                translate([x, y, main_base_offset_h-(fudge/2)]) cube([bucket_drain_hole_w, bucket_drain_hole_l, main_base_t+platform_lip_t+fudge]);
            }
        }
    }
}

/**
 * basesupport - Used to create the base mounting platform that holds the tipping bucket
 *               and the magnetic reed switch.  It also has a side mounting nipple to 
 *               attach to a standard PVC pipe.
 */
module base_support() {
    // main base
    difference() {
        union() {
            // base platform
            translate([-(main_base_w/2), -(main_base_l/2), main_base_offset_h]) cube([main_base_w, main_base_l, main_base_t]);
            
            //sides for mounting
            translate([-(main_base_w/2), -(main_base_l/2), main_base_offset_h-side_wall_h]) cube([main_base_t, main_base_l, side_wall_h]);
            translate([-(main_base_w/2)+main_base_t, -(main_base_l/2), main_base_offset_h]) rotate([270, 0, 0]) Triangle(a=side_wall_h, b=main_base_w-main_base_t, angle=90, height=main_base_t);
            translate([-(main_base_w/2)+main_base_t, (main_base_l/2)-main_base_t, main_base_offset_h]) rotate([270, 0, 0]) Triangle(a=side_wall_h, b=main_base_w-main_base_t, angle=90, height=main_base_t);
            translate([-(main_base_w/2)+main_base_t, -((mounting_pipe_od/2)+main_base_t), main_base_offset_h]) rotate([270, 0, 0]) Triangle(a=side_wall_h, b=main_base_w-main_base_t, angle=90, height=main_base_t);
            translate([-(main_base_w/2)+main_base_t, (mounting_pipe_od/2), main_base_offset_h]) rotate([270, 0, 0]) Triangle(a=side_wall_h, b=main_base_w-main_base_t, angle=90, height=main_base_t);
            
            //mounting pipe
            translate([-((main_base_w/2)+mounting_pipe_l), 0, main_base_offset_h-(side_wall_h/2)]) rotate([0, 90, 0]) cylinder(d=mounting_pipe_od, h=mounting_pipe_l);
        }
        //hole for wire to drop through to mounting pipe
        translate([-(standoff_spacing/2)-bucket_standoff_w-((angled_support_w*2)/3), 0, main_base_offset_h-(fudge/2)]) cylinder(d=4, h=main_base_t+platform_lip_t+fudge);
        
        //hollow out the mounting pipe
        translate([-((main_base_w/2)+mounting_pipe_l)-(fudge/2), 0, main_base_offset_h-(side_wall_h/2)]) rotate([0, 90, 0]) cylinder(d=mounting_pipe_id, h=mounting_pipe_l+main_base_t+fudge);
        
        //screw holes to attach to the funnel
        for(x=[-1, 1], y=[-1, 1]) {
            translate([x*((case_w/2)-(mount_hole_d/1.35)), y*((case_l/2)-(mount_hole_d/1.35)), main_base_offset_h-(fudge/2)]) cylinder(d=screw_hole_d+0.75, h=base_adjustment_standoff_h+platform_lip_t+main_base_t+fudge);
            translate([x*((case_w/2)-(mount_hole_d/1.35)), y*((case_l/2)-(mount_hole_d/1.35)), main_base_offset_h-(fudge/2)]) cylinder(d=mounting_screw_head_d, h=mounting_screw_head_t+(fudge/2));
        }
        // bucket adjustment screw holes
        translate([0, -(base_adjustment_standoff_spacing/2), main_base_offset_h-(fudge/2)]) cylinder(d=base_adjustment_screw_hole_d+4, h=base_adjustment_standoff_h+platform_lip_t+main_base_t+fudge);
        translate([0, (base_adjustment_standoff_spacing/2), main_base_offset_h-(fudge/2)]) cylinder(d=base_adjustment_screw_hole_d+4, h=base_adjustment_standoff_h+platform_lip_t+main_base_t+fudge);
        
        // left bucket drain
        translate([-(bucket_drain_w/2), -(platform_lip_l/2)+bucket_drain_edge_offset, main_base_offset_h+main_base_t+platform_lip_t-bucket_drain_recess-3]) cube([bucket_drain_w, bucket_drain_l, bucket_drain_recess+3+(fudge/2)]);
        
        // right bucket drain
        translate([-(bucket_drain_w/2), (platform_lip_l/2)-bucket_drain_edge_offset-bucket_drain_l, main_base_offset_h+main_base_t+platform_lip_t-bucket_drain_recess-3]) cube([bucket_drain_w, bucket_drain_l, bucket_drain_recess+3+(fudge/2)]);
        
    }
}

/**
 * cylindrical_coupling - This is the module used to create the sweeping funnel design 
 */
module cylindrical_coupling(h,r1,r2,shape=0.5, kernel="sigmoid", slices=100) {
    // Method:
    //  1. Calculate transition polygon using the selected kernel function
    //  2. Scale to desired size
    
    // Kernels
    function sigmoid(a,x) =-0.5+ 1 / (1+exp(-a*x));
    function tanh(a,x) = (1-exp(-2*a*x)) /(1+exp(-2*a*x));
    function nonlinear1(a,x) = a*x/sqrt(1+pow(a*x,2));
    function nonlinear2(a,x) = a*x/(1+abs(a*x));
    function linear(a,x) = a*x;
    
    // Select kernel
    function shape_func(a,x) = 
        (kernel=="sigmoid") ? sigmoid(a,x) : 
            (kernel=="tanh") ? tanh(a,x) : 
                (kernel=="linear") ? linear(a,x)  :
                    (kernel=="nonlinear1") ? nonlinear1(a,x) :
                        (kernel=="nonlinear2") ? nonlinear2(a,x) :
                            sigmoid(a,x); echo("WARNING: Unknown kernel. Using sigmoid");
              
    // Draw relative to x=[-10,10]
    x_min = -10;
    x_max = 10;
    x_span = x_max - x_min;
    x_step = x_span / slices;
    x = [for (i=[x_min:x_step:x_max+x_step]) i];

    // Derive y range
    y_max = shape_func(shape, x_max+x_step);
    y_min = shape_func(shape, x_min);
    y_span = y_max - y_min;
    
    // Calc scaling parameters
    y_scale = 1/y_span; 
    h_scale = h/x_span;
    L = r2-r1;
    
    // Generate polygon
    reducer_points = [for (i = [0:slices]) [r1+0.5*L+L*y_scale*shape_func(shape,x[i]),x[i]]];
    points = concat(reducer_points, [[0,x_max],[0,x_min]]);

    // Draw
    rotate_extrude()
    scale([1,h_scale,1])
    translate([0,x_max,0])polygon(points);
             
}

/* 
 * Triangle - module for making triangles and prisms
 *	 a: Length of side a
 *	 b: Length of side b
 *	 angle: angle at point angleAB
 */
module Triangle(
			a, b, angle, height=1, heights=undef,
			center=undef, centerXYZ=[false,false,false])
{
	// Calculate Heights at each point
	heightAB = ((heights==undef) ? height : heights[0])/2;
	heightBC = ((heights==undef) ? height : heights[1])/2;
	heightCA = ((heights==undef) ? height : heights[2])/2;
	centerZ = (center || (center==undef && centerXYZ[2]))?0:max(heightAB,heightBC,heightCA);

	// Calculate Offsets for centering
	offsetX = (center || (center==undef && centerXYZ[0]))?((cos(angle)*a)+b)/3:0;
	offsetY = (center || (center==undef && centerXYZ[1]))?(sin(angle)*a)/3:0;
	
	pointAB1 = [-offsetX,-offsetY, centerZ-heightAB];
	pointAB2 = [-offsetX,-offsetY, centerZ+heightAB];
	pointBC1 = [b-offsetX,-offsetY, centerZ-heightBC];
	pointBC2 = [b-offsetX,-offsetY, centerZ+heightBC];
	pointCA1 = [(cos(angle)*a)-offsetX,(sin(angle)*a)-offsetY, centerZ-heightCA];
	pointCA2 = [(cos(angle)*a)-offsetX,(sin(angle)*a)-offsetY, centerZ+heightCA];

	polyhedron(
		points=[	pointAB1, pointBC1, pointCA1,
					pointAB2, pointBC2, pointCA2 ],
		faces=[	
			[0, 1, 2],
			[3, 5, 4],
			[0, 3, 1],
			[1, 3, 4],
			[1, 4, 2],
			[2, 4, 5],
			[2, 5, 0],
			[0, 5, 3] ] );
}


// available options are: base, funnel, tipping_bucket, base_bucket, all

if (view == "base") {
    base();
} else if (view == "funnel") {
    translate([0, 0, 130]) {
        rotate([180, 0, 0]) {
            funnel_cover();
        }
    }
} else if (view == "tipping_bucket") {
    bucket();
} else if (view == "base_support") {
    base_support();
} else if (view == "base_bucket") {
    base();
    rotate([-20, 0, 0]) bucket();
} else if (view == "all") {
    base();
    rotate([-20, 0, 0]) bucket();
    funnel_cover();
} else {
    echo("UNKNOWN VIEW SELECTED. Set the view variable to define the view");
}
